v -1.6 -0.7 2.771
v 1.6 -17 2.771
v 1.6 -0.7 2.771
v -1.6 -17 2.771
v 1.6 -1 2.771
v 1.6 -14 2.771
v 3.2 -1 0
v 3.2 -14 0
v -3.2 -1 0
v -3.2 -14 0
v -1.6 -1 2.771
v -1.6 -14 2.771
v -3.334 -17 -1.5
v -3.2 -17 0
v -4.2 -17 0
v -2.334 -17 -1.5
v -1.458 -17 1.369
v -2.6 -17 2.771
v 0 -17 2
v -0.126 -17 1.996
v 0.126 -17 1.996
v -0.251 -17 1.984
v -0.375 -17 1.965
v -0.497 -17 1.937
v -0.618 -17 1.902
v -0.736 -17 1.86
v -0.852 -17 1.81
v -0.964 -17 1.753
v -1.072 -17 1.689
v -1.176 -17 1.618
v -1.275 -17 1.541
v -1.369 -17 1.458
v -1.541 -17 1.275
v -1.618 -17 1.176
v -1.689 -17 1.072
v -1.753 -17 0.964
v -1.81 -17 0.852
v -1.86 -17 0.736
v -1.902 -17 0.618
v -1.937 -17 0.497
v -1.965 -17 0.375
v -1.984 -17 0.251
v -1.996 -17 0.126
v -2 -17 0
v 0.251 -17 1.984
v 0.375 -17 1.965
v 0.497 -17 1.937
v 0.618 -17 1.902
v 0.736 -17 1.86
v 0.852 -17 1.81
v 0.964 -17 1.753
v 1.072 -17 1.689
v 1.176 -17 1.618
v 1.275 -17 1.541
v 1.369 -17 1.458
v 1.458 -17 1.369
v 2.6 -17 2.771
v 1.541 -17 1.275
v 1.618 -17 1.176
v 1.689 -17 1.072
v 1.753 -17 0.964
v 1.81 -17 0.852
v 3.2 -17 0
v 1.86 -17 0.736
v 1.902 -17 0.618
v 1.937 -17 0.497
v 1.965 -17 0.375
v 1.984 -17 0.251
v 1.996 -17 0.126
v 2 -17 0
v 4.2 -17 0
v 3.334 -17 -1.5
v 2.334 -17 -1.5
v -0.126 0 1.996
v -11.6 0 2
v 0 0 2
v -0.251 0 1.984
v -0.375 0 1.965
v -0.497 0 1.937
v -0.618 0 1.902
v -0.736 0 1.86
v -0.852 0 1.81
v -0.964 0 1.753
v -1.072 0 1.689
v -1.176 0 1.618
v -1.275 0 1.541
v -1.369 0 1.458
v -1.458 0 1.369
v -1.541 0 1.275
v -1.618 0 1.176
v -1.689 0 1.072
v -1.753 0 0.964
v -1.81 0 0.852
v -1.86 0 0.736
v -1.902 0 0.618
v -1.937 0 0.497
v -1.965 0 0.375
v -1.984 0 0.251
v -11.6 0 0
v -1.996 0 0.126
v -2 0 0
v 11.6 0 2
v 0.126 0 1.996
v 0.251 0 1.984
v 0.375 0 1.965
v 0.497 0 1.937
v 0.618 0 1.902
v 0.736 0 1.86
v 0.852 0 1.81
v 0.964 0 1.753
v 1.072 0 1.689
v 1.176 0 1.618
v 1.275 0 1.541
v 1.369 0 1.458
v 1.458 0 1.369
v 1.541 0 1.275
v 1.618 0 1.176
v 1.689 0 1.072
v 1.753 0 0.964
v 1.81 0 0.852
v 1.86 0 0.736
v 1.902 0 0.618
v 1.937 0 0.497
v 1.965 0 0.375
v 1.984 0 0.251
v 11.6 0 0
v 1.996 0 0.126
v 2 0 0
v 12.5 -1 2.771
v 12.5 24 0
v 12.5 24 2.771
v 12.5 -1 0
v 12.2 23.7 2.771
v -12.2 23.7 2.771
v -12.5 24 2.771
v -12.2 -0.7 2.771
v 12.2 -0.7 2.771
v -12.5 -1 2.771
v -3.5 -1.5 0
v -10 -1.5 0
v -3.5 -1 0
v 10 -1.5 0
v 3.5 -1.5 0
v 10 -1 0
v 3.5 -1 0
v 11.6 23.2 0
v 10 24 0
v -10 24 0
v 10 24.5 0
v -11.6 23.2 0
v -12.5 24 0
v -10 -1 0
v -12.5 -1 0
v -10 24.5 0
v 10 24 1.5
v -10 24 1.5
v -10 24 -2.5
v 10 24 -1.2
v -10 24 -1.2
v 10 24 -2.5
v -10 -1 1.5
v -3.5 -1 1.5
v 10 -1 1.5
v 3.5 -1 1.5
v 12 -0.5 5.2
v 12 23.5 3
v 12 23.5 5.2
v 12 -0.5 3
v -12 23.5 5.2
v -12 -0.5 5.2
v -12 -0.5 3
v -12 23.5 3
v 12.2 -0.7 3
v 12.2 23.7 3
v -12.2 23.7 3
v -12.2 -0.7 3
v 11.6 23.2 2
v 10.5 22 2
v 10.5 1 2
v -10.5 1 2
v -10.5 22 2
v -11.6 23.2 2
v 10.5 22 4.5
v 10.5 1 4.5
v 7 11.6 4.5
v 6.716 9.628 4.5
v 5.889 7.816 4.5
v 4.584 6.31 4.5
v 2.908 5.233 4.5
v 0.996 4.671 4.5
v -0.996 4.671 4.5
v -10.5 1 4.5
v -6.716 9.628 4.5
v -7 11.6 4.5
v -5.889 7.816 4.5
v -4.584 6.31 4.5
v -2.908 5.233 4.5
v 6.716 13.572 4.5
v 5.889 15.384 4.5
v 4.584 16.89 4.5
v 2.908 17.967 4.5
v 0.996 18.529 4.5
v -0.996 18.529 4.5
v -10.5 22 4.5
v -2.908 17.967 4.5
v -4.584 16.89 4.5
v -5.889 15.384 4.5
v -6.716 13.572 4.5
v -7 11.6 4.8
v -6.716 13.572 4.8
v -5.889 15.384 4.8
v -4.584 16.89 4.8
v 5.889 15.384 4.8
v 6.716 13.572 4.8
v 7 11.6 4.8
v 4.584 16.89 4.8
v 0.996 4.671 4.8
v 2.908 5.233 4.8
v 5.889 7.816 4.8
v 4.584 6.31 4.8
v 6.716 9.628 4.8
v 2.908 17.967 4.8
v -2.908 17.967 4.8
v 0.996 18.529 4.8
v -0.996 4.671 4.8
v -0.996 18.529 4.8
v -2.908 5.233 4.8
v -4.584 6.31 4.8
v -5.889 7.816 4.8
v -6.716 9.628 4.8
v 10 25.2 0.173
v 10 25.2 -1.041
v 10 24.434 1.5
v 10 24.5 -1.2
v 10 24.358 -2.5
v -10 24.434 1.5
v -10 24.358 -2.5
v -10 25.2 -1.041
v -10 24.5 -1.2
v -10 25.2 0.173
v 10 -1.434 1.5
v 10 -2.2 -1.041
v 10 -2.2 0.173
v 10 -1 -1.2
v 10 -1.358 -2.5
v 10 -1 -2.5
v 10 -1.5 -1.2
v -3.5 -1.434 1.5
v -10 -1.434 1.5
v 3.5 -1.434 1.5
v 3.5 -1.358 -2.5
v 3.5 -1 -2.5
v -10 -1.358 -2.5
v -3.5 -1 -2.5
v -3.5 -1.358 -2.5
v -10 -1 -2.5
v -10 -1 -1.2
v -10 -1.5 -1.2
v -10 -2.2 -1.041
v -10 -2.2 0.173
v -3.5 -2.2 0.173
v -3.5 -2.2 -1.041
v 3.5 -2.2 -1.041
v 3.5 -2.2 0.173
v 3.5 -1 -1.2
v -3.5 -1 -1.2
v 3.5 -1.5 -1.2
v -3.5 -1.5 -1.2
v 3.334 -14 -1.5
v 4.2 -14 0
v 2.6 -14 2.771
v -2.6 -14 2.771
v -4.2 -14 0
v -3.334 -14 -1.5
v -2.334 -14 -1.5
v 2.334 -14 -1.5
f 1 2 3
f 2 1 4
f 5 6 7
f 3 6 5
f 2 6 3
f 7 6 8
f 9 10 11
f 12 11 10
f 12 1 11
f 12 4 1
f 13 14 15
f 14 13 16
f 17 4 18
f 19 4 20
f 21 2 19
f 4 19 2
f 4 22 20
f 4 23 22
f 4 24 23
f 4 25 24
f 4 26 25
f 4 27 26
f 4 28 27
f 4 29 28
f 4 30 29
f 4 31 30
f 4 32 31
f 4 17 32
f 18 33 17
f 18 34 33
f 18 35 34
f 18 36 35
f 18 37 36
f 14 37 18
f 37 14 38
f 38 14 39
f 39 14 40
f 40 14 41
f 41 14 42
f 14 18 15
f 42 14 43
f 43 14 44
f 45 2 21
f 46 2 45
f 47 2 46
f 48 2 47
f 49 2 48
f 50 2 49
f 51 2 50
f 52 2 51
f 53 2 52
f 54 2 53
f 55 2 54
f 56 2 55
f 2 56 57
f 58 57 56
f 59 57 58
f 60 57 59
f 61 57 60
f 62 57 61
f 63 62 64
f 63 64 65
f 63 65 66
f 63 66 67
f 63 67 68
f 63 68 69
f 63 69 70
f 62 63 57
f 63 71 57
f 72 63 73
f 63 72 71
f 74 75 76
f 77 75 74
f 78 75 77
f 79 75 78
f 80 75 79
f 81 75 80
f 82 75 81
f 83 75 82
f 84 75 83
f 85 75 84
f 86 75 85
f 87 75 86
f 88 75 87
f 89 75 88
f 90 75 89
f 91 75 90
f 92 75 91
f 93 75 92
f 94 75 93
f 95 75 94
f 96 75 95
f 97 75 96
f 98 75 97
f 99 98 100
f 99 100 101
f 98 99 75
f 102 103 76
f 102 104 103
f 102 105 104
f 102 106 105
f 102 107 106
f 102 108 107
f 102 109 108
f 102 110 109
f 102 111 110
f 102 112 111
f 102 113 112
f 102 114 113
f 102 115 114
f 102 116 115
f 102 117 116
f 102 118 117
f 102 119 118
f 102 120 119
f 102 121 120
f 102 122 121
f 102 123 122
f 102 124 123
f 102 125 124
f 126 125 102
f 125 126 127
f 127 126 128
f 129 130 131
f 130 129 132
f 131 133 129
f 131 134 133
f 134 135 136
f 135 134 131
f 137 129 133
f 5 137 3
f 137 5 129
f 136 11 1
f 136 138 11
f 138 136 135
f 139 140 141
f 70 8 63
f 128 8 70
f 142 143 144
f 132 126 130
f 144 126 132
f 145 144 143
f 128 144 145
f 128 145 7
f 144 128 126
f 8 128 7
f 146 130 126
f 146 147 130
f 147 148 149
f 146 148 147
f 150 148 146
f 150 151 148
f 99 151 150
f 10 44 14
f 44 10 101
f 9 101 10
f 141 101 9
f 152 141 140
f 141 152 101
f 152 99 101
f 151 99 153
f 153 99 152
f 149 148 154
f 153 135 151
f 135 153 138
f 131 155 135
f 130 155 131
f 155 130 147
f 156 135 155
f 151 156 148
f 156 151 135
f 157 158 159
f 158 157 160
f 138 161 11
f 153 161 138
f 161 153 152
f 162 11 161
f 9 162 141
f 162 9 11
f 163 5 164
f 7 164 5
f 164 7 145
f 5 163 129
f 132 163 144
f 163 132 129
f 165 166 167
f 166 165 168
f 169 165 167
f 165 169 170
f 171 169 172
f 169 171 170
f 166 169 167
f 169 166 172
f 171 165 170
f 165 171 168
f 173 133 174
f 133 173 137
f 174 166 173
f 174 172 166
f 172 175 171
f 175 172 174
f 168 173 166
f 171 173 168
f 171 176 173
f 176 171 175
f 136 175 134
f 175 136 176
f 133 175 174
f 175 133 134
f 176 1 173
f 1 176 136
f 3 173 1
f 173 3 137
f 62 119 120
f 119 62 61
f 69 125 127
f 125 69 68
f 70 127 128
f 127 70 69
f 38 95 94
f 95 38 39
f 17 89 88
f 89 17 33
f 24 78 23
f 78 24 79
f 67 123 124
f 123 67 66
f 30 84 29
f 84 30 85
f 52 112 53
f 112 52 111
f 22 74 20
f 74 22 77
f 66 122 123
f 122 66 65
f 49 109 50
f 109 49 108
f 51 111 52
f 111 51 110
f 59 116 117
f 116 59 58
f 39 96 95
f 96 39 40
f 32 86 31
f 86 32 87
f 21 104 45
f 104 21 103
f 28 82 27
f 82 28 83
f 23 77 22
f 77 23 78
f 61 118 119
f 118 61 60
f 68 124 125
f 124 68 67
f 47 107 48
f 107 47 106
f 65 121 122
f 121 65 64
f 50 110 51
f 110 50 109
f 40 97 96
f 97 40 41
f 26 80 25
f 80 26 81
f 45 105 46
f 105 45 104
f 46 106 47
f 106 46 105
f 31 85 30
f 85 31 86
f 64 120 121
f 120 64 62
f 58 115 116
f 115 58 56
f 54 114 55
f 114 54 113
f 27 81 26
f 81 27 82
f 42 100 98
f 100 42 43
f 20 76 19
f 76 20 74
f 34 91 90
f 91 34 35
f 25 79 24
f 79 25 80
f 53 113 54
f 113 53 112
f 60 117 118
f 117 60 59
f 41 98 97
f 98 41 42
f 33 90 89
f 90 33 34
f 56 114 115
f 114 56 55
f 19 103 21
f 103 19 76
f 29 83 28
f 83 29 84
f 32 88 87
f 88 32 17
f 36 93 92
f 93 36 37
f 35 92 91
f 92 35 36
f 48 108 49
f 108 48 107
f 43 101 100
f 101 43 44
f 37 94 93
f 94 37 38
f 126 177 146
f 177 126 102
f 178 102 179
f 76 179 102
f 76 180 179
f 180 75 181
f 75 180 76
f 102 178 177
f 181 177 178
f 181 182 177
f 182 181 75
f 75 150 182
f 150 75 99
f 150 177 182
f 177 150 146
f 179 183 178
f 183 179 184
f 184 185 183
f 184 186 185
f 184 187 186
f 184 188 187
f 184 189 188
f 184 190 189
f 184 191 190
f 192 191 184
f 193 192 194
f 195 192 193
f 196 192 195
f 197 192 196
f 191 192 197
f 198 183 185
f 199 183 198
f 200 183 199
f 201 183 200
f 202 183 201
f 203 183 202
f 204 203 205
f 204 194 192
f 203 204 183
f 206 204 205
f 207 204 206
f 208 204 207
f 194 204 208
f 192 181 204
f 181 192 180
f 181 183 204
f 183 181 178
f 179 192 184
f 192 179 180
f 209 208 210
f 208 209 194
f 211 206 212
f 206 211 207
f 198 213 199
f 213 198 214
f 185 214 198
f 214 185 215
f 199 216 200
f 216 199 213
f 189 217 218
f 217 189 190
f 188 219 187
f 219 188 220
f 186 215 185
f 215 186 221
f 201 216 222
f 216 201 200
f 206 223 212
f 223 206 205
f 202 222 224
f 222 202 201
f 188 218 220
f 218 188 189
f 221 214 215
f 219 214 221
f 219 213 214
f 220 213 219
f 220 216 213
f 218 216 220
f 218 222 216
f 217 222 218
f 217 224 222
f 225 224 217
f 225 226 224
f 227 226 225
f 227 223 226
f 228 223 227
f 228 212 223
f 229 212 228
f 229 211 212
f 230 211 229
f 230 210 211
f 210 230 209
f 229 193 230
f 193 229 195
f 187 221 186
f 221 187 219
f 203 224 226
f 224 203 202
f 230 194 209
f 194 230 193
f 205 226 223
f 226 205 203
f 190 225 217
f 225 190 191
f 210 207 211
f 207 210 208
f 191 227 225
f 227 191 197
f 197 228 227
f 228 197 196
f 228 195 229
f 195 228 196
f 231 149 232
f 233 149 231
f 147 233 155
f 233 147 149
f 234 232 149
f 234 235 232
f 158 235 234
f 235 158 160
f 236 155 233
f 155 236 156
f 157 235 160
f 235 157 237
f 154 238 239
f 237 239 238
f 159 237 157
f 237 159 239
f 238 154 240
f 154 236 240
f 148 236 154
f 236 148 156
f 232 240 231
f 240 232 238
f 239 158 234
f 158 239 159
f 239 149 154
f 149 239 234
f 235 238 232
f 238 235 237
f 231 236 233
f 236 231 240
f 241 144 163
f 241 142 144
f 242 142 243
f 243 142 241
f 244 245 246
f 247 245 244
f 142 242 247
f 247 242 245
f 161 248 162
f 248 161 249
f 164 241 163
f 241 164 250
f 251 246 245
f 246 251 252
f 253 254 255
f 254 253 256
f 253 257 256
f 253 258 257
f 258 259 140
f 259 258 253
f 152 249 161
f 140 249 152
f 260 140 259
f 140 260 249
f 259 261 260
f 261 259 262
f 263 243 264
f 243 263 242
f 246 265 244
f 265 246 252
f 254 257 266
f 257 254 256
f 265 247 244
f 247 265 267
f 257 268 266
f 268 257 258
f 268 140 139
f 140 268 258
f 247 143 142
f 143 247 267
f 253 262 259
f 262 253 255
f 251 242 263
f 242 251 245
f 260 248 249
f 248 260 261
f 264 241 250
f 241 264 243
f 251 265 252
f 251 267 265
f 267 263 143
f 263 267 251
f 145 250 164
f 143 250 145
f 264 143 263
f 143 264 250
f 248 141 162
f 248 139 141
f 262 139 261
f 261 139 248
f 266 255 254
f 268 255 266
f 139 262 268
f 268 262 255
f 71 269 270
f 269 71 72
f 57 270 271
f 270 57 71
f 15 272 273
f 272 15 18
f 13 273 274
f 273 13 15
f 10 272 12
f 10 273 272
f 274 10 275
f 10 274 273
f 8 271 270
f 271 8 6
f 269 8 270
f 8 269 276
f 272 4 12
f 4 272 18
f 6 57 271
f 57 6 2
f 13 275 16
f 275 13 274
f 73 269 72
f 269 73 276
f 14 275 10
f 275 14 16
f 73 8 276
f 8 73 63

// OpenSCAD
module antenna(){
    rotate([90,0,0])cylinder(h=22,r=2,$fn=100);
    translate([-23.2/2,0,-1])cube([23.2,23.2,3]);
    translate([-21/2,1,-2])cube([21,21,6.5]);
    translate([-21/2,1,-2])cube([21,22,3]);
    translate([-20/2,0,-2])cube([20,3,3]);
    translate([0,23.2/2,0])cylinder(h=4.8,r=7);
}


module caseb_outer() {
    rotate([90,0,0])cylinder(h=17,r=3.2,$fn=6);
    translate([-25/2,-1,-2.771])cube([25,25,2.771]);

    translate([-10,23.5,-1])cube([20,1,1]);
    translate([-10,-1.4,-1])cube([20,1,1]);
}
module caseb() difference(){
    caseb_outer();
    antenna();
    translate([-25,-25,0])cube([50,60,5]);
    
    translate([11.5,-2,-3])rotate([0,30,0])cube([5,30,5]);
    translate([-15.5,-2,-6])rotate([0,-30,0])cube([5,30,5]);
    
    translate([2.8,-17,-2])cube([10,3,4]);
    translate([-12.8,-17,-2])cube([10,3,4]);
}


module caset_outer(){
    rotate([90,0,0])cylinder(h=17,r=3.2,$fn=6);
    translate([-25/2,-1,0])cube([25,25,2.771]);

    translate([-24/2,-0.5,0])cube([24,24,5.2]);
    translate([-24.4/2,-0.7,0])cube([24.4,24.4,3]);
}

module caset_notabs() difference(){
    caset_outer();
    antenna();
    translate([-25,-25,-5])cube([50,60,5]);
}
module tabprofile() difference(){
    translate([-10,24.0,-2.5])cube([20,1.2,4.0]);
    translate([-10,23.5,-1.2])cube([20,1,1.2]);
    
    translate([-10,24.3,-2.6])rotate([-30,0,0])cube([20,1,2]);
    translate([-10,25.3,0.0])rotate([30,0,0])cube([20,1,2]);
}

module caset(){
    caset_notabs();
    tabprofile();
    difference(){
        translate([0,23,0])scale([1,-1,1]) tabprofile();
        translate([-3.5,-2.5,-2.6])cube([7,5,5]);
    }
    difference(){
        intersection(){
            translate([0,-14,0])rotate([90,0,0])cylinder(h=3,r=4.2,$fn=6);
            translate([-5,-20,-1.5])cube([10,10,4.271]);
        }
        translate([0,-14,0])rotate([90,0,0])cylinder(h=4,r=3.2,$fn=6);
        
    }
}

//difference(){
color("#8f8") caset();
  //  translate([0,-25,-10])cube([50,60,20]);
//}

//render()
//caseb();


difference(){
    //color("#f88")caseb();
    //translate([-25,10,-10])cube([50,60,20]);
}



%antenna();
